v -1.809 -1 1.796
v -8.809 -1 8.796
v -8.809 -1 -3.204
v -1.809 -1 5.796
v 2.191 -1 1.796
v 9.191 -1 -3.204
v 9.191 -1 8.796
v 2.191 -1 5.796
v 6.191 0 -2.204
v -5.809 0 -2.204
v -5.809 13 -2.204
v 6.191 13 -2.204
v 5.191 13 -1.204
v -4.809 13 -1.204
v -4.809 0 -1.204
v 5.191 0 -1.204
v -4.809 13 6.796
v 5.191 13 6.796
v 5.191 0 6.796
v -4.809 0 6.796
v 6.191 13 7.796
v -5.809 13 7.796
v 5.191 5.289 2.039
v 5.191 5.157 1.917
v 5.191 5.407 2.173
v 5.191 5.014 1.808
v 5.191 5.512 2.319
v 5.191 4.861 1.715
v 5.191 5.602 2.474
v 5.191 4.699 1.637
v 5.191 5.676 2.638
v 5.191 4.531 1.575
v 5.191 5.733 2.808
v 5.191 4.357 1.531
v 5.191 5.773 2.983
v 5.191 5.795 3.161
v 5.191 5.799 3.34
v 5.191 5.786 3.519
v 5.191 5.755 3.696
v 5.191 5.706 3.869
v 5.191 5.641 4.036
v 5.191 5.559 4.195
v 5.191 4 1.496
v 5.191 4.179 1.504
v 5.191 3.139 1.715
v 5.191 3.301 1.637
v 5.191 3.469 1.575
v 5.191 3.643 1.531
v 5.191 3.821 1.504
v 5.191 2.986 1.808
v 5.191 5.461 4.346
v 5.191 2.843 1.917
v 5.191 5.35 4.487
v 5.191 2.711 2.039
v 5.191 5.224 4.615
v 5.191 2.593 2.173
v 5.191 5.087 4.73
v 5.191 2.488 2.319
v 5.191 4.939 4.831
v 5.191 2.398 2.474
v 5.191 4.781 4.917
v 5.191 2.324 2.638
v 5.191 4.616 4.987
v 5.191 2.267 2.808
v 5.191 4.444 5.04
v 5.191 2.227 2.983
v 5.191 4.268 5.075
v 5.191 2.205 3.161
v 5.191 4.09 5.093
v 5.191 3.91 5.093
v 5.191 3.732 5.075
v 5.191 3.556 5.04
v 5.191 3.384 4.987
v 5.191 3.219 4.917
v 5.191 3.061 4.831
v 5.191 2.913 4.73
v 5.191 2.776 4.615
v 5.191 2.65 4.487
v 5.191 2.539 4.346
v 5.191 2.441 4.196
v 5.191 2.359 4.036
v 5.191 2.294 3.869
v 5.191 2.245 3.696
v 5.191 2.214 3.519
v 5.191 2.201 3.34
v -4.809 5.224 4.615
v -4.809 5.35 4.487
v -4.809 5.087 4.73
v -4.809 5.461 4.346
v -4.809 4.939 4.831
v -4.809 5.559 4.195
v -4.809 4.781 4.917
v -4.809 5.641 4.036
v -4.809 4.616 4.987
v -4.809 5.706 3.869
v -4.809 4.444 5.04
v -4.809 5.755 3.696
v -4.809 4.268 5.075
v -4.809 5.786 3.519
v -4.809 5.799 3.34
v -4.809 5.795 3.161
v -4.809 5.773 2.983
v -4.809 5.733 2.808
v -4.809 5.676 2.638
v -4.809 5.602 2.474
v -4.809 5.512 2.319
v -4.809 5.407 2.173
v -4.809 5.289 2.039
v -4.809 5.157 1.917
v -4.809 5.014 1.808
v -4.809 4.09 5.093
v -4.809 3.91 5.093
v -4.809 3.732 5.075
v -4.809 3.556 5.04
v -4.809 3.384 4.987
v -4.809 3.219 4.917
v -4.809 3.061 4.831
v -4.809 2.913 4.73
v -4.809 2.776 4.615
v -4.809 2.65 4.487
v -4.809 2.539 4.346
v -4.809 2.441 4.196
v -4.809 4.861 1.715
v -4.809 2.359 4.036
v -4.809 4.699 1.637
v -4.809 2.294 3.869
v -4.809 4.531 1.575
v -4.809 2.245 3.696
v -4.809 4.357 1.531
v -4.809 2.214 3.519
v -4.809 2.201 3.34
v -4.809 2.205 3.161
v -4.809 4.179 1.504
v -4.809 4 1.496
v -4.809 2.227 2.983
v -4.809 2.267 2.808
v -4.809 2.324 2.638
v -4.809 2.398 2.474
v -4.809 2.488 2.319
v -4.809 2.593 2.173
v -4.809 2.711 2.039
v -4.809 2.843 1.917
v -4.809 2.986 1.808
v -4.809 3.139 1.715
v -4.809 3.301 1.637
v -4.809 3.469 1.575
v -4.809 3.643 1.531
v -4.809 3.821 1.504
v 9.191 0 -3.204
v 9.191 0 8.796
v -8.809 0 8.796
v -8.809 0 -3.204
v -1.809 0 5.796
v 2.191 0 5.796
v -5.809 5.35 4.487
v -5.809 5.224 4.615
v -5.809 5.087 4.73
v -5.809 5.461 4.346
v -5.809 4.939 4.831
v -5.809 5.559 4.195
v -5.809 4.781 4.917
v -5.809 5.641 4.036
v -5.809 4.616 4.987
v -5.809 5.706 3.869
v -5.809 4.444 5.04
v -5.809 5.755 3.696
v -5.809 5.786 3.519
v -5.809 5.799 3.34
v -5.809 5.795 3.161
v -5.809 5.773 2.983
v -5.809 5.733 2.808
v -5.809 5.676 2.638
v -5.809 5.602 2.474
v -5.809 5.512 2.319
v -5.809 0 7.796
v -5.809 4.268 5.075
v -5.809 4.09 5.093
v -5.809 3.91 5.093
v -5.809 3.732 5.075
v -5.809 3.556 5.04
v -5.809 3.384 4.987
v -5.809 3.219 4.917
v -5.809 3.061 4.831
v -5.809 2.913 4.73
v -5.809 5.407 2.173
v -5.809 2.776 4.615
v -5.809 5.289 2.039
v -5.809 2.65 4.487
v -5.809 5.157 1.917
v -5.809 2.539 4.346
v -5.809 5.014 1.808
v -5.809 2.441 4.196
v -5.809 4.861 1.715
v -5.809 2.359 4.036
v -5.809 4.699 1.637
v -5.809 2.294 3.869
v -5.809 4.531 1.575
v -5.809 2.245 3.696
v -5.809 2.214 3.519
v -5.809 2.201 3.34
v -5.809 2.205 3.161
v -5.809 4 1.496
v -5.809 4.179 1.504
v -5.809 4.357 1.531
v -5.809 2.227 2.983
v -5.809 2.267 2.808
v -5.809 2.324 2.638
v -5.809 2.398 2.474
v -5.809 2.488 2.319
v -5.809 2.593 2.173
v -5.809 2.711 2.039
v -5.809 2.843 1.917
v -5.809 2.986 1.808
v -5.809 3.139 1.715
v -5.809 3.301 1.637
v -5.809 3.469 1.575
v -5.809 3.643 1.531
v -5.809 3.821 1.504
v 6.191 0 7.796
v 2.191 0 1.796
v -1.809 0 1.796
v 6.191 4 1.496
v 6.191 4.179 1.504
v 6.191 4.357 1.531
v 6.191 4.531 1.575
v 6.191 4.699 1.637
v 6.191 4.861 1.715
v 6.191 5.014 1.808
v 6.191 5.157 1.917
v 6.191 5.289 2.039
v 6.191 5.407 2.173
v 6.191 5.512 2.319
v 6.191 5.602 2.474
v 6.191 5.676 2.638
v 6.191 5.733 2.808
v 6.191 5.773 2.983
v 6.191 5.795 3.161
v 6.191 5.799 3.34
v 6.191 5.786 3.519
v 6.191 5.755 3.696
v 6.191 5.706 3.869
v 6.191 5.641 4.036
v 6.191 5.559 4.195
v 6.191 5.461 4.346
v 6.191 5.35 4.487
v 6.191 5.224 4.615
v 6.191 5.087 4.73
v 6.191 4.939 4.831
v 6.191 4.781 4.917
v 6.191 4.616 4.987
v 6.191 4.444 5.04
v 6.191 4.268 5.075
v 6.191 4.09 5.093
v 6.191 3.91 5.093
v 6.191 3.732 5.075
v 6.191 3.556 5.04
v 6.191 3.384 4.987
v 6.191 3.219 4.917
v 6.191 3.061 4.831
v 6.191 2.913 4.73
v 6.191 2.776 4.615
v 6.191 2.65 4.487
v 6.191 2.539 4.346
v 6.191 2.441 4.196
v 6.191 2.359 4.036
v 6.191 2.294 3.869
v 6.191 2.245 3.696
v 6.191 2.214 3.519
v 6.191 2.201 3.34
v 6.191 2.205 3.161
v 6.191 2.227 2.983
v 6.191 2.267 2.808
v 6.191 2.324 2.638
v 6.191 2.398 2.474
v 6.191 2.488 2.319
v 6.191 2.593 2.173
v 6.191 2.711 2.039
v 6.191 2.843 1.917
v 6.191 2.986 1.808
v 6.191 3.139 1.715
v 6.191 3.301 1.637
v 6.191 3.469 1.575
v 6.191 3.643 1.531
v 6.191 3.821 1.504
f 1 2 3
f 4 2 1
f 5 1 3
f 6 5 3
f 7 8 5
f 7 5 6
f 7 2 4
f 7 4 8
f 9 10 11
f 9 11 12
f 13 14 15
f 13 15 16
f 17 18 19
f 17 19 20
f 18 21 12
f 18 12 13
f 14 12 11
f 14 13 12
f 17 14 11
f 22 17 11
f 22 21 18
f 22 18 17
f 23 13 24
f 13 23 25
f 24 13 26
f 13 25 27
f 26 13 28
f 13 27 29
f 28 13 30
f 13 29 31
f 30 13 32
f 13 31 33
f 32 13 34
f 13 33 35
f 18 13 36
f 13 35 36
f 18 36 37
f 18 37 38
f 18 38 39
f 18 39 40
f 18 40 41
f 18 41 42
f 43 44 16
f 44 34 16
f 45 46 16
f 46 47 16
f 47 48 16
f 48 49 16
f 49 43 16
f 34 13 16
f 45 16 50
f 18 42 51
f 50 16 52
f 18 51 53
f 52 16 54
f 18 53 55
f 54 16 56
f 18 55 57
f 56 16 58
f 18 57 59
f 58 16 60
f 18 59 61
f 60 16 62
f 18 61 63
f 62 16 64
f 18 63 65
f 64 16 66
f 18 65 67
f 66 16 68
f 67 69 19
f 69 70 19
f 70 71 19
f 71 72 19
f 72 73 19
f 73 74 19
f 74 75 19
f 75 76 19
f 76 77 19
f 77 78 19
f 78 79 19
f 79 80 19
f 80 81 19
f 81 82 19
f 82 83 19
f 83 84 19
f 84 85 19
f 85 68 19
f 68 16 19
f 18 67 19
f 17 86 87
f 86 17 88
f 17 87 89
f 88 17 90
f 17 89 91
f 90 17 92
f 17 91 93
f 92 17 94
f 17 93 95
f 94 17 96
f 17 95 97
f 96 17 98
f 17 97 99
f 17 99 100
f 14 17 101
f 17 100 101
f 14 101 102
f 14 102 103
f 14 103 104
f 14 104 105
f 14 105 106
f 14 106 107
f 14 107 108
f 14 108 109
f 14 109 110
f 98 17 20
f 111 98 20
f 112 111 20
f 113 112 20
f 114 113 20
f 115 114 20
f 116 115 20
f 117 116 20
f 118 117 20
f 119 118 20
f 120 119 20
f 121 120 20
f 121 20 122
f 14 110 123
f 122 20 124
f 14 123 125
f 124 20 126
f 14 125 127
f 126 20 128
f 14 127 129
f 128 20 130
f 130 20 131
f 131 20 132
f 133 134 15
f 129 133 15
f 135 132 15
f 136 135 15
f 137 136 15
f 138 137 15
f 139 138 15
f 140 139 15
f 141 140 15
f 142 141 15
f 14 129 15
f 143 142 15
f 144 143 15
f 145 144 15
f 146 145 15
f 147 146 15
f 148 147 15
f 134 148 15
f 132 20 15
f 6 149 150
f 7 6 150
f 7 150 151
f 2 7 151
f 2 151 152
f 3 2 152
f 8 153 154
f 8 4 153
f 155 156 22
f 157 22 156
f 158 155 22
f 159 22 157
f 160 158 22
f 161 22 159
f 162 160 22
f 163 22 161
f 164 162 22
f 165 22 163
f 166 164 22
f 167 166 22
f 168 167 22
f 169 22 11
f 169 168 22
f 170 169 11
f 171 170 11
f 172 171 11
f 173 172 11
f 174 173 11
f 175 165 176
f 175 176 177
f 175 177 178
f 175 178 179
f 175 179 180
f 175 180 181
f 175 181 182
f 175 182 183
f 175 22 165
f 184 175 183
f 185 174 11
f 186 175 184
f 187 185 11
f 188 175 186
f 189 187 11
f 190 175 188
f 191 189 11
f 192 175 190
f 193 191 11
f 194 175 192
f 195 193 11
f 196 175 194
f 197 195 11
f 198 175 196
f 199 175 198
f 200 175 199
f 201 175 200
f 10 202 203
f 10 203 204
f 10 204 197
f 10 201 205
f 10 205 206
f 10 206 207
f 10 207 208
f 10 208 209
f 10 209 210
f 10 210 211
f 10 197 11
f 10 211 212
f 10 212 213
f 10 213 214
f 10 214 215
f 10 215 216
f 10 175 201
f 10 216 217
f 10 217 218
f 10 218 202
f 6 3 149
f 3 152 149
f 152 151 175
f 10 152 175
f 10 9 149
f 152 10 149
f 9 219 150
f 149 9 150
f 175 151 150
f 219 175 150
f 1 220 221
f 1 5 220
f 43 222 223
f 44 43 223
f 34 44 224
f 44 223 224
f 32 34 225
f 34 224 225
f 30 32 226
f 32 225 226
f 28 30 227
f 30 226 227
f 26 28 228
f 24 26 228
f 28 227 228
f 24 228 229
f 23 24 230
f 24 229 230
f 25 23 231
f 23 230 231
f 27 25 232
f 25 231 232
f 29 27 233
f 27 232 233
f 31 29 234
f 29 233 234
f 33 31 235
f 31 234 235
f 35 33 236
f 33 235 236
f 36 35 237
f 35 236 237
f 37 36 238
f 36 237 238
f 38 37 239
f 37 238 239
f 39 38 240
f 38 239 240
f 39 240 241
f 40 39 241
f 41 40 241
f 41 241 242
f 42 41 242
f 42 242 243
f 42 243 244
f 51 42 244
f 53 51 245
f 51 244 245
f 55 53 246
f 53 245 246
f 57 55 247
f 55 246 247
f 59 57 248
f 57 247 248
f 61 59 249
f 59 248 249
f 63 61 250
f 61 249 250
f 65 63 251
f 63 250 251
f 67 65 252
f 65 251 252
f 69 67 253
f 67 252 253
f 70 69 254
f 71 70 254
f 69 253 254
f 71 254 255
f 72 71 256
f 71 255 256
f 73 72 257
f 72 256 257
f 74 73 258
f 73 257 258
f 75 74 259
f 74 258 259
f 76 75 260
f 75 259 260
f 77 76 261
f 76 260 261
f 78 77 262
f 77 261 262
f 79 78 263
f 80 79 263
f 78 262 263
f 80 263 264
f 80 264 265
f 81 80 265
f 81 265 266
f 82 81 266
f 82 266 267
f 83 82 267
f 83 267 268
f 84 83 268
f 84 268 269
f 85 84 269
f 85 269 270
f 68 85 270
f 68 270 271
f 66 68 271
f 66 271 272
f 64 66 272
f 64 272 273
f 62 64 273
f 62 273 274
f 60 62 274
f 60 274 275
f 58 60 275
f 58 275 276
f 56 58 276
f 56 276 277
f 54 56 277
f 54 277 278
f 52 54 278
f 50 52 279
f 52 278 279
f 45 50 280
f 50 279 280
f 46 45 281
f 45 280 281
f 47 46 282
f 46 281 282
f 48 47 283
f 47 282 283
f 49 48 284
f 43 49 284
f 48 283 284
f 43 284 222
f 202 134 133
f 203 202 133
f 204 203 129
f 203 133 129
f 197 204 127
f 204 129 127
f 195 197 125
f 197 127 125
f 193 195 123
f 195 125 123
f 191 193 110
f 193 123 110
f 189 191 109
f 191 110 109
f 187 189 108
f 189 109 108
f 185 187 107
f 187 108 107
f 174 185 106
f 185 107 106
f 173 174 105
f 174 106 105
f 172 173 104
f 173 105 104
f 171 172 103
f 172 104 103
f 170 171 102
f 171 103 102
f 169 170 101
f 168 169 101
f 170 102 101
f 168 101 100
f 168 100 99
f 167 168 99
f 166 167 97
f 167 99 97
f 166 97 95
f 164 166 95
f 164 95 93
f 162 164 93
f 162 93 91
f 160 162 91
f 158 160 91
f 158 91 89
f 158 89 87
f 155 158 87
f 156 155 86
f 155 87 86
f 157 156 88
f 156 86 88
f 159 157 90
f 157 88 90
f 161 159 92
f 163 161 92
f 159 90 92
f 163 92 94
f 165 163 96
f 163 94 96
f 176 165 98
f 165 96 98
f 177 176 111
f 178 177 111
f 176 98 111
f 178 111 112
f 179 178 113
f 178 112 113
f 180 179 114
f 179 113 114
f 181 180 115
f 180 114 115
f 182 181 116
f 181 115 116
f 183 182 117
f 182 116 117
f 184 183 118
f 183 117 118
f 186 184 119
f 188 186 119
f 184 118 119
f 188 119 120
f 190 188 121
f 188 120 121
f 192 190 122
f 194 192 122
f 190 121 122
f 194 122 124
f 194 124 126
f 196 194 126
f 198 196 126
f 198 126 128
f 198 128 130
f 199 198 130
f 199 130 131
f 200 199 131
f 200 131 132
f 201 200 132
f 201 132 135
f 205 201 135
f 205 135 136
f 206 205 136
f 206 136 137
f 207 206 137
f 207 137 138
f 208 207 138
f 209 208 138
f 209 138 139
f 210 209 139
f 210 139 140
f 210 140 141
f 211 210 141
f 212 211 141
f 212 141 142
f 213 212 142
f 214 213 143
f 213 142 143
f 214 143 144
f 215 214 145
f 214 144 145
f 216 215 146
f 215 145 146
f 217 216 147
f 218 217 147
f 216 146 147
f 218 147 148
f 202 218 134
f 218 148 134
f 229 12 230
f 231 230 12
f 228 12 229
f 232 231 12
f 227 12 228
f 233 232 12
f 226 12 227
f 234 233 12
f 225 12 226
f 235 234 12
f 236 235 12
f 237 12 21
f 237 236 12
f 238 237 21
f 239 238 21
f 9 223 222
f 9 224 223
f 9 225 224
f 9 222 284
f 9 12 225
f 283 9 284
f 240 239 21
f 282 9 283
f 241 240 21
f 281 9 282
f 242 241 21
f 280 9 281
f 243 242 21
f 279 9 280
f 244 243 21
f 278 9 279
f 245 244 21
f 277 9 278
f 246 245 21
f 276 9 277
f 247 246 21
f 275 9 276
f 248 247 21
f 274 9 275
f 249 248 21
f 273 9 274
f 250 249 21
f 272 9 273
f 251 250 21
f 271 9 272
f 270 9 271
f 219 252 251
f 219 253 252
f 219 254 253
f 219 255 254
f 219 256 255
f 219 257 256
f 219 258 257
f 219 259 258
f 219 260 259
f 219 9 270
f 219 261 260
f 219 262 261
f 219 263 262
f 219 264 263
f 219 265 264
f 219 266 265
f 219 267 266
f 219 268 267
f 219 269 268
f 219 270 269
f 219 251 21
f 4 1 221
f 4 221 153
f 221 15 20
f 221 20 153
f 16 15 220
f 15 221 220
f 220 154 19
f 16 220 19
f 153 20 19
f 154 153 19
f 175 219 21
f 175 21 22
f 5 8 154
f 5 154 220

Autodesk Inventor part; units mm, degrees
ref_plane "YZ Plane" through (0, 0, 0) normal (1, 0, 0) x (0, 1, 0)
ref_plane "XZ Plane" through (0, 0, 0) normal (0, 1, 0) x (-1, 0, 0)
ref_plane "XY Plane" through (0, 0, 0) normal (0, 0, 1) x (1, 0, 0)
sketch "Sketch1" plane through (0, 0, 0) normal (0, 1, 0) x (-1, 0, 0)
  line L0 (-6.1909, 7.7955) -> (5.8091, 7.7955)
  line L1 (5.8091, 7.7955) -> (5.8091, -2.2045)
  line L2 (5.8091, -2.2045) -> (-6.1909, -2.2045)
  line L3 (-6.1909, -2.2045) -> (-6.1909, 7.7955)
  point P0 (0, 0)
  dimension "d0" = 12
  dimension "d1" = 10
extrude "Extrusion1" add sketch "Sketch1" along normal blind 13
sketch "Sketch2" plane through (6.1909, 0, 7.7955) normal (1, 0, 0) x (0, 0, -1)
  line L0 (10, 0) -> (0, 0) projected
  line L1 (10, 0) -> (10, 13) projected
  line L2 (0, 0) -> (0, 13) projected
  circle A0 centre (4.5, 4) radius 1.8
  point P0 (7.7955, 0)
  dimension "d4" = 3.6
  dimension "d5" = 4
  dimension "d7" = 5.5
  dimension "d8" = 4.5
extrude "Extrusion2" cut sketch "Sketch2" against normal blind 13
sketch "Sketch3" plane through (0, 0, 0) normal (0, -1, 0) x (1, 0, 0)
  line L0 (6.1909, 7.7955) -> (-5.8091, 7.7955) projected
  line L1 (-5.8091, 7.7955) -> (-5.8091, -2.2045) projected
  line L2 (-5.8091, -2.2045) -> (6.1909, -2.2045) projected
  line L3 (6.1909, -2.2045) -> (6.1909, 7.7955) projected
  line L4 (-4.8091, 6.7955) -> (-4.8091, -1.2045)
  line L5 (-4.8091, -1.2045) -> (5.1909, -1.2045)
  line L6 (5.1909, -1.2045) -> (5.1909, 6.7955)
  line L7 (5.1909, 6.7955) -> (-4.8091, 6.7955)
  point P0 (0, 0)
  dimension "d11" = 1
  dimension "d12" = 1
  dimension "d14" = 1
  dimension "d15" = 1
extrude "Extrusion3" cut sketch "Sketch3" against normal blind 13 contours L7 L6 L5 L4
sketch "Sketch4" plane through (0, 0, 0) normal (0, -1, 0) x (1, 0, 0)
  line L0 (6.1909, 7.7955) -> (-5.8091, 7.7955) projected
  line L1 (-5.8091, 7.7955) -> (-5.8091, -2.2045) projected
  line L2 (-5.8091, -2.2045) -> (6.1909, -2.2045) projected
  line L3 (6.1909, -2.2045) -> (6.1909, 7.7955) projected
  line L4 (-8.8091, 8.7955) -> (-8.8091, -3.2045)
  line L5 (-8.8091, -3.2045) -> (9.1909, -3.2045)
  line L6 (9.1909, -3.2045) -> (9.1909, 8.7955)
  line L7 (9.1909, 8.7955) -> (-8.8091, 8.7955)
  point P0 (0, 0)
  dimension "d18" = 3
  dimension "d19" = 3
  dimension "d20" = 1
  dimension "d21" = 1
  dimension "d34" = 18
  dimension "d35" = 12
  dimension "d36" = 12
extrude "Extrusion4" add sketch "Sketch4" along normal blind 1 contours L3 L2 L1 L0 | L7 L6 L5 L4
sketch "Sketch5" plane through (0, -1, 0) normal (0, -1, 0) x (1, 0, 0)
  line L0 (9.1909, -3.2045) -> (9.1909, 8.7955) projected
  line L1 (9.1909, 8.7955) -> (-8.8091, 8.7955) projected
  line L2 (0.1909, 5.7955) -> (2.1909, 5.7955)
  line L3 (2.1909, 5.7955) -> (2.1909, 1.7955)
  line L4 (2.1909, 1.7955) -> (-1.8091, 1.7955)
  line L5 (-1.8091, 1.7955) -> (-1.8091, 5.7955)
  line L6 (-1.8091, 5.7955) -> (2.1909, 5.7955)
  point P0 (0, 0)
  dimension "d27" = 2
  dimension "d28" = 4
  dimension "d29" = 4
  dimension "d30" = 3
  dimension "d31" = 9
extrude "Extrusion5" cut sketch "Sketch5" against normal blind 1
properties part number "krytymotor"
